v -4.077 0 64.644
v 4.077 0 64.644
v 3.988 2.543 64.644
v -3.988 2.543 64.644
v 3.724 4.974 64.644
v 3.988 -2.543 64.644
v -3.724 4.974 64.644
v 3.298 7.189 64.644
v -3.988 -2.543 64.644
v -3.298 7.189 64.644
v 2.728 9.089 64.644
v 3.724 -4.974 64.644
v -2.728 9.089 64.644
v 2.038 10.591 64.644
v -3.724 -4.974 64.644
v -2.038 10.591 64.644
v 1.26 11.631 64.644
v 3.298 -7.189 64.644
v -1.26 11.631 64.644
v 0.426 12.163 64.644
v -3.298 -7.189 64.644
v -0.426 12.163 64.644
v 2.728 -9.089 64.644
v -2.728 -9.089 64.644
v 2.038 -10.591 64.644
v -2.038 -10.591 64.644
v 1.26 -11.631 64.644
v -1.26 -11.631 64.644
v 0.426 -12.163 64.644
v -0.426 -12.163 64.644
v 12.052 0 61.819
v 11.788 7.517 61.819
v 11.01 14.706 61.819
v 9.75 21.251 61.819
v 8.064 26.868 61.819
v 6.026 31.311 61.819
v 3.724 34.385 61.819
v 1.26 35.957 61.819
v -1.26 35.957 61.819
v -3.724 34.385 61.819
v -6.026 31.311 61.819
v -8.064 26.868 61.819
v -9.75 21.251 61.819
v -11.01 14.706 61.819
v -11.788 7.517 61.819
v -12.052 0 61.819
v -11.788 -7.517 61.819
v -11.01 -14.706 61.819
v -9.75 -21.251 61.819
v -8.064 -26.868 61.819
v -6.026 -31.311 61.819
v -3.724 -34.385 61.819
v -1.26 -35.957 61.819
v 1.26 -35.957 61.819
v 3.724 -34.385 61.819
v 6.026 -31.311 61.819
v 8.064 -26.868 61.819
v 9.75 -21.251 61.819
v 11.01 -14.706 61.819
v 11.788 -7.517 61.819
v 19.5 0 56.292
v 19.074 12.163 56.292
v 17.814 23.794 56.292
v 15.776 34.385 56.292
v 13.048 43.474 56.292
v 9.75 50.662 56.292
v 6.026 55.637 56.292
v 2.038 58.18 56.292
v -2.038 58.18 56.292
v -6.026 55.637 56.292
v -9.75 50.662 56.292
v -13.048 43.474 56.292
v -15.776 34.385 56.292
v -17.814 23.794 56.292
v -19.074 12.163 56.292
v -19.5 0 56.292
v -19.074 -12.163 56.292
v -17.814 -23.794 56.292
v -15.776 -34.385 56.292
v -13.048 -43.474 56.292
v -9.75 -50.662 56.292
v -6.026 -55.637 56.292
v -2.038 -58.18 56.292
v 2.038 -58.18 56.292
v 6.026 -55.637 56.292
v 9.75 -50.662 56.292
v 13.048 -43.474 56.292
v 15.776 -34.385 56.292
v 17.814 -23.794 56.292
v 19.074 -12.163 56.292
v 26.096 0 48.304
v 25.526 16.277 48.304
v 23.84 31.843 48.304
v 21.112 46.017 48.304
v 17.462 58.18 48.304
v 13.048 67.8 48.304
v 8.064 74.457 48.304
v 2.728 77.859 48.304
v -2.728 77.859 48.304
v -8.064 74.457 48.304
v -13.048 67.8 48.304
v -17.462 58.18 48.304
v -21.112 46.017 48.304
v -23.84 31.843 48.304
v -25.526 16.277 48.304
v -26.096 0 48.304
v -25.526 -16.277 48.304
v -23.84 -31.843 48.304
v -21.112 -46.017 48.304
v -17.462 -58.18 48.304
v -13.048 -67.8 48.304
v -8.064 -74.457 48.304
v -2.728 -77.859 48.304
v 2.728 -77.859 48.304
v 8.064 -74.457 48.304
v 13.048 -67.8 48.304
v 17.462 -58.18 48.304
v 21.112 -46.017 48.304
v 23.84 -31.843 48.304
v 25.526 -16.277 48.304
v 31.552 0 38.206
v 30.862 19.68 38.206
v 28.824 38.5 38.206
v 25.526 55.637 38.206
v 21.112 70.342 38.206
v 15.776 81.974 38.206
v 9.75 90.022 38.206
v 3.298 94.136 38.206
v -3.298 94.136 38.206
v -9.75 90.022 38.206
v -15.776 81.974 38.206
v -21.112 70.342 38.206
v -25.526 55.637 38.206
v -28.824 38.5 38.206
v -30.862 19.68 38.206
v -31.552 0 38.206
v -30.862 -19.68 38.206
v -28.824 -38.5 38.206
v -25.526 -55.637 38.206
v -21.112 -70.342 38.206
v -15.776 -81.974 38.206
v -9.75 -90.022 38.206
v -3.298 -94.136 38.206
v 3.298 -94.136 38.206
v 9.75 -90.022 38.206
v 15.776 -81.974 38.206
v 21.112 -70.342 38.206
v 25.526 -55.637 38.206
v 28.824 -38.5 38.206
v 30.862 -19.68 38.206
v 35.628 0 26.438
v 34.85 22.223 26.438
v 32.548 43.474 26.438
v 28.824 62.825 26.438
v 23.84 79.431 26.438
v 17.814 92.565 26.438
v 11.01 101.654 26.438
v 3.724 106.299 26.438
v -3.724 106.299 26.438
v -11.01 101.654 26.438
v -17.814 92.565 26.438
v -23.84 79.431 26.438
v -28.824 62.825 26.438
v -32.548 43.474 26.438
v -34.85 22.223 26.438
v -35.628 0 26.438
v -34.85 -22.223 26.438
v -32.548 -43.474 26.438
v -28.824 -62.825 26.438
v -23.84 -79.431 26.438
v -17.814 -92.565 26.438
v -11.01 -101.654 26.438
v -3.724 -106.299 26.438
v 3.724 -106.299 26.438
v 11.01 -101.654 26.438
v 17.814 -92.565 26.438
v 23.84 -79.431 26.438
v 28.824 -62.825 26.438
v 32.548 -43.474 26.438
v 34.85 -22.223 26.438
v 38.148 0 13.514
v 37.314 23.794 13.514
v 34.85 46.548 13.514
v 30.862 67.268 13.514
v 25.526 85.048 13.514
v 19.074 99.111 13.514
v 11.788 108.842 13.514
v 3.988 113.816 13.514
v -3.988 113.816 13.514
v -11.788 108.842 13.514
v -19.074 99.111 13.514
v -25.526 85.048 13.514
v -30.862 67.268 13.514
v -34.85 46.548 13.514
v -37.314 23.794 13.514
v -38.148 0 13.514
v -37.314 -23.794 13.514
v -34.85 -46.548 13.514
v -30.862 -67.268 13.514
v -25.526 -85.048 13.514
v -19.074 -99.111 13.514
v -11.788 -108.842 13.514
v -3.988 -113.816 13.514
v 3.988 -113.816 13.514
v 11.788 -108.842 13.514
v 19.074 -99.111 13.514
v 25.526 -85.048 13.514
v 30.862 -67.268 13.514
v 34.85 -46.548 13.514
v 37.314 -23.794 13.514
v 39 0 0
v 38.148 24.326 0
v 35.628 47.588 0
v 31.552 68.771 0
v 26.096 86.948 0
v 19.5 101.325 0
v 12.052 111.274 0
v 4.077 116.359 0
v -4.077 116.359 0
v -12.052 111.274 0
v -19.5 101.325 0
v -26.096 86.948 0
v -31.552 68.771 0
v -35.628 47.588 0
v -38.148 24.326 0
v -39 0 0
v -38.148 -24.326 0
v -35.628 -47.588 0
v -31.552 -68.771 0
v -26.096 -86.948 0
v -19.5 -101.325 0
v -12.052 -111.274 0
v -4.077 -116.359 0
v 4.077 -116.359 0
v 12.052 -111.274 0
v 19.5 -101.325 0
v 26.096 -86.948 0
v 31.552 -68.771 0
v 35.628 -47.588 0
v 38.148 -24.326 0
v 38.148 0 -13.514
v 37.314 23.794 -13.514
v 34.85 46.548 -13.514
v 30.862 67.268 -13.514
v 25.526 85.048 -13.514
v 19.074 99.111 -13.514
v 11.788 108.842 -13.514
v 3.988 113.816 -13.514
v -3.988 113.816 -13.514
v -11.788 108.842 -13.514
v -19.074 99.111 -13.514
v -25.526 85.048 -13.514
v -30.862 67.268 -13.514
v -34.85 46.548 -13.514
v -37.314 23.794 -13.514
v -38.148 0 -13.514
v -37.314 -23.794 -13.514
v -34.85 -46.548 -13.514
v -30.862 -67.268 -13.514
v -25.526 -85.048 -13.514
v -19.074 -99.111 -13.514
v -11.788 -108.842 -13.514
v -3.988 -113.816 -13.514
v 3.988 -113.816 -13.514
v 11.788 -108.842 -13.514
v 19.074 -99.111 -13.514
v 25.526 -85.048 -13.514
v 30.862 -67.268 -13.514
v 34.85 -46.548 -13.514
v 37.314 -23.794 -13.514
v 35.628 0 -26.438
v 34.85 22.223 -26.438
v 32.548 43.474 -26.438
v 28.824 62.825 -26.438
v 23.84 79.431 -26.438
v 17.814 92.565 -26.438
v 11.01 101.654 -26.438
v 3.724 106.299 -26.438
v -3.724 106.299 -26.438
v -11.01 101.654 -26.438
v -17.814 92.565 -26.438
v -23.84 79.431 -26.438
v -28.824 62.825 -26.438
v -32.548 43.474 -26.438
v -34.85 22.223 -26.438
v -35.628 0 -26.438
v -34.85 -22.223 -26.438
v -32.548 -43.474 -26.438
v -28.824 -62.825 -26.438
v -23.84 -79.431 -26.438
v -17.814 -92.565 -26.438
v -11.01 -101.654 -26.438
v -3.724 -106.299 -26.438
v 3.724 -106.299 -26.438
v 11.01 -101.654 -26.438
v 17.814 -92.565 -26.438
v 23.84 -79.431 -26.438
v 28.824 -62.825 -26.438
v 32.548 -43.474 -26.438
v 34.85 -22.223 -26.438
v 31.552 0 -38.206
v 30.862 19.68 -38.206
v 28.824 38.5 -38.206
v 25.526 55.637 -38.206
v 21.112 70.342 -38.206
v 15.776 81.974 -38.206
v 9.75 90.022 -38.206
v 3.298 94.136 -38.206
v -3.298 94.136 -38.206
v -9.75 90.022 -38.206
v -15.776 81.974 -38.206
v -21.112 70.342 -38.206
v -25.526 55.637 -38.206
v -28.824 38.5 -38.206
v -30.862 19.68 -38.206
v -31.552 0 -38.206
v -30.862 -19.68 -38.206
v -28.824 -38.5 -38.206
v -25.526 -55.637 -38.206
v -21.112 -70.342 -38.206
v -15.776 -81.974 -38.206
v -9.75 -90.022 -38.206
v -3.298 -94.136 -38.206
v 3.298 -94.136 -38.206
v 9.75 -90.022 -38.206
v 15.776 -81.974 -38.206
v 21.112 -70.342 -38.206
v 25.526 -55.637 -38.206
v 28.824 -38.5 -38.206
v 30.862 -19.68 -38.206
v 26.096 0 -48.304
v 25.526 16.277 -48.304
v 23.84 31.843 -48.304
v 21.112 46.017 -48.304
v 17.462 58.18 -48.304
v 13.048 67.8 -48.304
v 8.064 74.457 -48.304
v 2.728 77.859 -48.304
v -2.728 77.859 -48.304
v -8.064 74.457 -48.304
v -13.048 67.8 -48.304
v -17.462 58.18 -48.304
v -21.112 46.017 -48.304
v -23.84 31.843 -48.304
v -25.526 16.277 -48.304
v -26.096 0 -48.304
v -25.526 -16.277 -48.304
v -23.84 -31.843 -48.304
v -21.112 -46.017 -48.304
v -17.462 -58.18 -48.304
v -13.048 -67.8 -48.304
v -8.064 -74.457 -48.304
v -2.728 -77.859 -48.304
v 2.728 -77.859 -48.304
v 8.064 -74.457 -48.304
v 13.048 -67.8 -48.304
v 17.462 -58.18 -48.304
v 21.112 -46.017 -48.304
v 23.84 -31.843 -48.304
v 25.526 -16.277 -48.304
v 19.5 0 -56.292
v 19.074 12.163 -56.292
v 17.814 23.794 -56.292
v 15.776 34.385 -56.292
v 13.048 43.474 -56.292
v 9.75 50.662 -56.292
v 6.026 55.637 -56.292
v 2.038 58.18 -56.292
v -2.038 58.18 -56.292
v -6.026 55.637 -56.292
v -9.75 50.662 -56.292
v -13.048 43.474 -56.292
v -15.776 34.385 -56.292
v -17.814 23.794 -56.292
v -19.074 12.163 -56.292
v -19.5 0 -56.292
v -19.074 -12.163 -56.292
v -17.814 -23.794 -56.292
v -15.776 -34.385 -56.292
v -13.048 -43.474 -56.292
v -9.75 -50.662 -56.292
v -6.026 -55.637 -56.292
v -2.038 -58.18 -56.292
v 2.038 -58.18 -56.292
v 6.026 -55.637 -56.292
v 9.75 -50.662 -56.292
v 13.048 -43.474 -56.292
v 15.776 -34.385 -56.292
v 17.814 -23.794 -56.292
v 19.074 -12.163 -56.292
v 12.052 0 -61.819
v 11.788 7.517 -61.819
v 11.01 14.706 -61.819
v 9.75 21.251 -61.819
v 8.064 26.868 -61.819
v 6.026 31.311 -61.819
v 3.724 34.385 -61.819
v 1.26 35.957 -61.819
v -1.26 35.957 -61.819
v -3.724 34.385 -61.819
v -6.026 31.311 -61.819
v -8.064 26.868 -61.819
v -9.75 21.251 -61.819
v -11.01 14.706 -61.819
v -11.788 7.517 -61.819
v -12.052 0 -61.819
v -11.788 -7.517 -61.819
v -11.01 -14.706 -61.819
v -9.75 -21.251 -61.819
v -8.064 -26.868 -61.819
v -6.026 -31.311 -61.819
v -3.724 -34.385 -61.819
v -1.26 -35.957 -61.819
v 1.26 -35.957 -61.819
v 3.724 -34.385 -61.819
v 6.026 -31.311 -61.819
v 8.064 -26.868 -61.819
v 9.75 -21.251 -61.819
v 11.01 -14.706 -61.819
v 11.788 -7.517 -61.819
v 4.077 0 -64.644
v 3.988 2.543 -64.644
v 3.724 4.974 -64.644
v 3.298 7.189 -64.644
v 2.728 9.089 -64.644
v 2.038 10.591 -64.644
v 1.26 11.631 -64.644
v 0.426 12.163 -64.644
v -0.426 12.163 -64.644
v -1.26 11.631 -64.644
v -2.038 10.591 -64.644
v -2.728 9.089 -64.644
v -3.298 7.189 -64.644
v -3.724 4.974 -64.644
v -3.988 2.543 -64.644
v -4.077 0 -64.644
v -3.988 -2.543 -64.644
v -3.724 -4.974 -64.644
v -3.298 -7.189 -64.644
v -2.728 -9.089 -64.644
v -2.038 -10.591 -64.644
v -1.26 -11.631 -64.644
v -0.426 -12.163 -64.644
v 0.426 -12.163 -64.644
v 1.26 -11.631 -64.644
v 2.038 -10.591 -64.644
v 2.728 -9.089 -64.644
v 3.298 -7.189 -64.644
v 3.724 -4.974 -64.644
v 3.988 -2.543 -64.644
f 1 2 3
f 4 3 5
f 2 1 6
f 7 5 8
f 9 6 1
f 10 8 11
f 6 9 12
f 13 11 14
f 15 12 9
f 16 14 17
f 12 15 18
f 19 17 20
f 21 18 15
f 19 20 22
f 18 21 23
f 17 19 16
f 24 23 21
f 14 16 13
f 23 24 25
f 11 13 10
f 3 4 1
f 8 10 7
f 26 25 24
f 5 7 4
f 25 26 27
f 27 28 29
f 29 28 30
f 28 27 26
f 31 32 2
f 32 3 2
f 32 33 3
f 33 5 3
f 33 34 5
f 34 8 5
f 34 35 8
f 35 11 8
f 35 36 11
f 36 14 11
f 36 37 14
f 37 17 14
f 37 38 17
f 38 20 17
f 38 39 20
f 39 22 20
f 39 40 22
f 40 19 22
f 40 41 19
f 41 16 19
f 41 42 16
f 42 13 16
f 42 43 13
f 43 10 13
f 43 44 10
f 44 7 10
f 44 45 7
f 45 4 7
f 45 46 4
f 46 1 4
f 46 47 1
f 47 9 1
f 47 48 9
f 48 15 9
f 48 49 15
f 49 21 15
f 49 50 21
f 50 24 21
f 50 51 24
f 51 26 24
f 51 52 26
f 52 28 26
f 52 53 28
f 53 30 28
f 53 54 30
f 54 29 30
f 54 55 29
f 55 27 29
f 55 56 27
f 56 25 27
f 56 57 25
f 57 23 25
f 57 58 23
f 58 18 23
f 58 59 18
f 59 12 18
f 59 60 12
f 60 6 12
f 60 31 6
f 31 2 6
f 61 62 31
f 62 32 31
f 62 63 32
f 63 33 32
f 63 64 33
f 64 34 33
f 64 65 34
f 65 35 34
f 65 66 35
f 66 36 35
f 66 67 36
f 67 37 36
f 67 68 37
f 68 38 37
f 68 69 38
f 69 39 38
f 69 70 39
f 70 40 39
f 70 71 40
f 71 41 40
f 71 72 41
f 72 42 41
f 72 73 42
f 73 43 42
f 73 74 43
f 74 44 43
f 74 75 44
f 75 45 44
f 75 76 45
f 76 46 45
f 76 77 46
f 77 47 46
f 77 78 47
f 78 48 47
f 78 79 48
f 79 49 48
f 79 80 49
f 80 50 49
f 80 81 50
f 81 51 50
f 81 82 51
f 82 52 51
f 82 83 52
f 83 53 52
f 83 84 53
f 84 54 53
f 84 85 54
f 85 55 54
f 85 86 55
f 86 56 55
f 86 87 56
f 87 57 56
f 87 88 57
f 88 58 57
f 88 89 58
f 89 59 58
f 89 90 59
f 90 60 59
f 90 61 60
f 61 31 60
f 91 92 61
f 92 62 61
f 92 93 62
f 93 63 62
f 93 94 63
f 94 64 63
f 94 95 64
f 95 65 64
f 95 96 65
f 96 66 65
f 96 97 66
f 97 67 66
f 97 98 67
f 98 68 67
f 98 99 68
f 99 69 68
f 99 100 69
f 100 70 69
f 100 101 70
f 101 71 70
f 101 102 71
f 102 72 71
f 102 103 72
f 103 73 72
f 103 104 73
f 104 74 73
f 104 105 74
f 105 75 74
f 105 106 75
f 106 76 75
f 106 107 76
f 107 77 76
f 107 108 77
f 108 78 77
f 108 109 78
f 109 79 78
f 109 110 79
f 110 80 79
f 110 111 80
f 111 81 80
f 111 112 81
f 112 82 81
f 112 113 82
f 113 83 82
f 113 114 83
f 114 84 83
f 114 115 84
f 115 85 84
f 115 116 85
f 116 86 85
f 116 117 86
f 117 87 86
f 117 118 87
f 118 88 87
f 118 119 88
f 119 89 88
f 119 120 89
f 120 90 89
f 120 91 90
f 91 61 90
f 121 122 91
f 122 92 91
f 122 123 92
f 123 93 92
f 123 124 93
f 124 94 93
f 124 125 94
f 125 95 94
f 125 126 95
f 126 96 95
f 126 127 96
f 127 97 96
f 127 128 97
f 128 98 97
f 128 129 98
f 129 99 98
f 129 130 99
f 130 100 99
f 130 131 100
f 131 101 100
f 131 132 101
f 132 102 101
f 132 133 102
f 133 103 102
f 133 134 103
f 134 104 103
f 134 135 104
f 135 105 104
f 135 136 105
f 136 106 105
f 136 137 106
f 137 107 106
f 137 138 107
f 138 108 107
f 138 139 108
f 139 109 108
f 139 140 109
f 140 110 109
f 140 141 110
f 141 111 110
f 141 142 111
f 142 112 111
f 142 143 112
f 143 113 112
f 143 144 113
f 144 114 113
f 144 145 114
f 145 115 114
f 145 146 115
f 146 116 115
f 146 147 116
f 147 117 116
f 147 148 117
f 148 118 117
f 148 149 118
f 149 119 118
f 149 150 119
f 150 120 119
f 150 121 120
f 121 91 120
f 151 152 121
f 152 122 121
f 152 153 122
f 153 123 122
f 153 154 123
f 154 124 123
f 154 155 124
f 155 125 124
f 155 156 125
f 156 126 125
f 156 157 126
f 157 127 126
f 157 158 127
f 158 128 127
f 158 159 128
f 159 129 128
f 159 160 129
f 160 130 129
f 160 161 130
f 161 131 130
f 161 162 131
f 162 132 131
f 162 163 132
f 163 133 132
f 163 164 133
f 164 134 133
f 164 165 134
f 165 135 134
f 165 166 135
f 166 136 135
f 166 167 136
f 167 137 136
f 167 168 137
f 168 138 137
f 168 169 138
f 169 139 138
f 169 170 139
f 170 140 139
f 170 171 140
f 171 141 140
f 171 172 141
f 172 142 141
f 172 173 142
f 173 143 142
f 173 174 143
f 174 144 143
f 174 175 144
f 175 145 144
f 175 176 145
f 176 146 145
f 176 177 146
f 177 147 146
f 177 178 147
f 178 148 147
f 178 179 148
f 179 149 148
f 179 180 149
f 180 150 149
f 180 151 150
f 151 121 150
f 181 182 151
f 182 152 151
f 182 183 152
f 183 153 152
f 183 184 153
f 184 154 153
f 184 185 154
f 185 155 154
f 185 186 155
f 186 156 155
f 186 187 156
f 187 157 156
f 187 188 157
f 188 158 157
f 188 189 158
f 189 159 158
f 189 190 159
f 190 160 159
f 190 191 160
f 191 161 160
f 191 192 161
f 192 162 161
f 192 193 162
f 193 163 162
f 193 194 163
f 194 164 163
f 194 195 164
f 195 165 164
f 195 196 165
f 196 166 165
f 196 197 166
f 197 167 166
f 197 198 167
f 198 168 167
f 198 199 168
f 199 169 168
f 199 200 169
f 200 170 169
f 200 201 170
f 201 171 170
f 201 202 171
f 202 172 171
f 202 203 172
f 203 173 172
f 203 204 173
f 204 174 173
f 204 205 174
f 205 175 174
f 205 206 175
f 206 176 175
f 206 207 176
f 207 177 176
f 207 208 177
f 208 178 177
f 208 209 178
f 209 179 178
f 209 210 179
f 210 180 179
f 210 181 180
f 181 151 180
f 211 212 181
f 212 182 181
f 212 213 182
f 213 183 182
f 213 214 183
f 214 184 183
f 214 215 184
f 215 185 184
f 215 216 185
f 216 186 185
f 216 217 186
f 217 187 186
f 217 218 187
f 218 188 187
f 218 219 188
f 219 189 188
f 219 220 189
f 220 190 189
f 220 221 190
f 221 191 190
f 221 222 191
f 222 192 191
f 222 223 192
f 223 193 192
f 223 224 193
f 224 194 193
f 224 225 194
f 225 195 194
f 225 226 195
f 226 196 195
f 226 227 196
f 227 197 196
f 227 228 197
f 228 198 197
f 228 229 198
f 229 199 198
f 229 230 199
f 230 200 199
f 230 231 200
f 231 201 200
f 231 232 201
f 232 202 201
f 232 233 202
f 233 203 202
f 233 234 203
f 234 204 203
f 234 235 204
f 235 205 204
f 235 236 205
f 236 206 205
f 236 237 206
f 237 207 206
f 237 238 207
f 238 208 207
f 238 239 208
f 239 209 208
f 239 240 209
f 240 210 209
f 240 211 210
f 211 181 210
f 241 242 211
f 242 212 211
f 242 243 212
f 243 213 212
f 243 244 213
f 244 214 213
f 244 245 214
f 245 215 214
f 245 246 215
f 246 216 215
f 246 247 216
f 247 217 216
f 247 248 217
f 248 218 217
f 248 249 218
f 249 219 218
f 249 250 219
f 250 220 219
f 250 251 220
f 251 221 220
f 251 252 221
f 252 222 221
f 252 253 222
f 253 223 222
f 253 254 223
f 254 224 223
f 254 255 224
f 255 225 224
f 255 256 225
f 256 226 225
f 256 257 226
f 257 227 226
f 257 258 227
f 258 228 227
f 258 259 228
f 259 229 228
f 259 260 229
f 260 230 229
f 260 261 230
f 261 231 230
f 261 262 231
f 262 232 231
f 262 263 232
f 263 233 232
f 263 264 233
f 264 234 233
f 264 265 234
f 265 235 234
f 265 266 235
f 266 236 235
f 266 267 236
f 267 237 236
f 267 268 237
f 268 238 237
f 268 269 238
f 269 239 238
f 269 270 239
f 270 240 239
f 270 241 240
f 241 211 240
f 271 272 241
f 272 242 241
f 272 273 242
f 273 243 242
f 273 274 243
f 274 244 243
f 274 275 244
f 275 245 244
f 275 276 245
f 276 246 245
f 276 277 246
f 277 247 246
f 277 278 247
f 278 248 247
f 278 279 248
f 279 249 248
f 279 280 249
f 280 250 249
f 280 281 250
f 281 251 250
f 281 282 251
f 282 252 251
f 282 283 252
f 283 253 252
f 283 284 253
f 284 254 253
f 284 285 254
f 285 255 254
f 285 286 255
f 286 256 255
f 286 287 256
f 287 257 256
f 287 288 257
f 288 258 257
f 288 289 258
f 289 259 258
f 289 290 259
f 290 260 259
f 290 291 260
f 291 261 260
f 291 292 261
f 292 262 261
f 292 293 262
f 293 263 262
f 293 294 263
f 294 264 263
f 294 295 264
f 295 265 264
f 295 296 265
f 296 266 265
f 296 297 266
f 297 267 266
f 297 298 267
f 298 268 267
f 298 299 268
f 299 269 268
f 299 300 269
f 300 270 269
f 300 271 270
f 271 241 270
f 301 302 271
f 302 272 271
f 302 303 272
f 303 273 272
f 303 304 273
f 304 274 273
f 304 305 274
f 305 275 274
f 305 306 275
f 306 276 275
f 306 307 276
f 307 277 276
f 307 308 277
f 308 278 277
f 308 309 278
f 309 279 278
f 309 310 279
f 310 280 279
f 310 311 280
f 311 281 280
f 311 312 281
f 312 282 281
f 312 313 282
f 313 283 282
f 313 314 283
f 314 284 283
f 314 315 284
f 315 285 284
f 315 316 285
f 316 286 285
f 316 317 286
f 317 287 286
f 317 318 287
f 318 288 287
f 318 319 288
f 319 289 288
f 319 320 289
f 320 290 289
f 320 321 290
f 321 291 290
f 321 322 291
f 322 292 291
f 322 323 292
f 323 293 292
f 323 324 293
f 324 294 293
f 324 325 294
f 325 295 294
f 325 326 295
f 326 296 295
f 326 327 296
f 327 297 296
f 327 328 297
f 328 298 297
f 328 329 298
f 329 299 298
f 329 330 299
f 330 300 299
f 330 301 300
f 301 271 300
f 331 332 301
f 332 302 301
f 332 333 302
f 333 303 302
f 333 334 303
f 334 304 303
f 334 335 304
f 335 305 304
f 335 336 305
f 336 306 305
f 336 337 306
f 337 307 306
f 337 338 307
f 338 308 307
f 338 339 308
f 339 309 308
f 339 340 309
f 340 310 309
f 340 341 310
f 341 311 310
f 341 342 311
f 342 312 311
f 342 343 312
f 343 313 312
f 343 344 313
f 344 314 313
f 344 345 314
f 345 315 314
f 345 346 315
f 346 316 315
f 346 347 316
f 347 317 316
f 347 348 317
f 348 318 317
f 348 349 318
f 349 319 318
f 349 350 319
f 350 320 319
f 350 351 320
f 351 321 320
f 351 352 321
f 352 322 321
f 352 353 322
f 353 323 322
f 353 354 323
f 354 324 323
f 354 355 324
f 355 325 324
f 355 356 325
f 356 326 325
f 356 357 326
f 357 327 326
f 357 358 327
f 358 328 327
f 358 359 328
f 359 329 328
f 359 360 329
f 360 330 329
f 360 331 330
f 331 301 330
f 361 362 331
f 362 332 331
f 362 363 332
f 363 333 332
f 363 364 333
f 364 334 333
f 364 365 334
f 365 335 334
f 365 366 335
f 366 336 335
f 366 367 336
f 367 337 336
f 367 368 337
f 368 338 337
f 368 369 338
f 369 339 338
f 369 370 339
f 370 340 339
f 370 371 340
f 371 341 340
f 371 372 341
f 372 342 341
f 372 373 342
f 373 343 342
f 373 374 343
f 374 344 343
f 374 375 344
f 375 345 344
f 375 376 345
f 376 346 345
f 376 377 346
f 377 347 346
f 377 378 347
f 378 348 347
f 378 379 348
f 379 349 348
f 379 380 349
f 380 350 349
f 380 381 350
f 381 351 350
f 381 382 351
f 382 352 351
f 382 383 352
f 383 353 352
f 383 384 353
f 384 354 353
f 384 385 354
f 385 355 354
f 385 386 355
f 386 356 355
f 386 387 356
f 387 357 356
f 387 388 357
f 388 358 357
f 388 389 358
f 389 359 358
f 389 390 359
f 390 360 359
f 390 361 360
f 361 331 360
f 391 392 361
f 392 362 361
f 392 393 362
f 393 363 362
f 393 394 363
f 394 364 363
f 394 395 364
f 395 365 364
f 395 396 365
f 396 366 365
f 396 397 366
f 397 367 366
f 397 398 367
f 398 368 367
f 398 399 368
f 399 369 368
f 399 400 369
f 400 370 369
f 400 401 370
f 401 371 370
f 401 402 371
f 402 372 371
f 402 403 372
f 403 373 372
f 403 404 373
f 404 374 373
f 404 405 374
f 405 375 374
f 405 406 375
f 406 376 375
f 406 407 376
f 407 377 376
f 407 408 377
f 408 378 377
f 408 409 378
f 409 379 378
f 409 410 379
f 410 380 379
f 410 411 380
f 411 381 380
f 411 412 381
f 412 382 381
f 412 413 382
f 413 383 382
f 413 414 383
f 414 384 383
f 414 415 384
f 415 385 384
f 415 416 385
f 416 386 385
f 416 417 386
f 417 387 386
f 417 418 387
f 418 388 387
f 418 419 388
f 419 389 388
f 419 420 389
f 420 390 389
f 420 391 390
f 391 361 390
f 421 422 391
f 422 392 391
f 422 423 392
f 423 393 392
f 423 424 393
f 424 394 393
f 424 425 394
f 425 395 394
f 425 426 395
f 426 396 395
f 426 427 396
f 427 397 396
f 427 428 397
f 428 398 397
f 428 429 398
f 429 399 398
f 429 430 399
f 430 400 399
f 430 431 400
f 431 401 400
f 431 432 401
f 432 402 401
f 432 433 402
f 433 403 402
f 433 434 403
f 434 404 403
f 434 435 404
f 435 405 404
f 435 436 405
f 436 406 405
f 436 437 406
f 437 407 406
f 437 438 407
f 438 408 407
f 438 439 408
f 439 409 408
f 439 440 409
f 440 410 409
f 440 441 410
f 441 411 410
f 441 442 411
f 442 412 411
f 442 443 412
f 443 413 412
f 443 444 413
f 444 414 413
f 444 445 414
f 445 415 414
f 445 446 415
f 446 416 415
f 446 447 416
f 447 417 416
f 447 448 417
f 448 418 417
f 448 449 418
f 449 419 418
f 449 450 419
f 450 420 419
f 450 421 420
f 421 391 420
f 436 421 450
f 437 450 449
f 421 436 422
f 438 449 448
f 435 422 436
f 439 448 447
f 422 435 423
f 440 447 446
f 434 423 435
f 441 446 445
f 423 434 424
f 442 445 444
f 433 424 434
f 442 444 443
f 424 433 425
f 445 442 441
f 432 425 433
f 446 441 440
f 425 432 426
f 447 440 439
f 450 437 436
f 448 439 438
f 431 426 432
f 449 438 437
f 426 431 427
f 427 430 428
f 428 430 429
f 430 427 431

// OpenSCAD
// Generated by SolidPython 1.0.1 on 2020-07-29 00:46:45


scale(v = [3, 9, 5]) {
	sphere(r = 13);
}
/***********************************************
*********      SolidPython code:      **********
************************************************
 
# import packages: SolidPython
from solid import *
from solid.utils import *
from itertools import chain, combinations, permutations


class Resize:

    def __init__(self, scad_file):
        self.scad_file = scad_file
        #self.scad_file = import_scad(scad_file)
        # cone/cylinder param:
        self.r1 = 0
        self.r2 = 0
        self.h = 0
        # rectangular prism param:
        self.w = 0
        self.l = 0
        # ellipse param:
        self.r = 0

    # import OpenScad code (file name corresponds to shape)


    # classify shape + parameters
    def assign(self, param1, param2, param3):
        if self.scad_file == 'cone.scad':
            self.r1 = param1
            self.r2 = param2
            self.h = param3
        elif self.scad_file == 'cylinder.scad':
            self.r1 = param1
            self.r2 = param2
            self.h = param3
        elif self.scad_file == 'rectangularPrism.scad':
            self.h = param1
            self.l = param2
            self.w = param3
        else:
            self.r = param1
            self.h = param2

    # resize parameters
    def iterate(self):
        x = range(3, 20, 2)
        i = 1
        if self.scad_file == 'cone.scad':
            tempList = list(permutations(x, 2))
            for temp in tempList:
                param1 = temp[0]
                param2 = temp[1]
                filepath = 'produced_scad_files/' + 'cone' + str(param1) + '_' + str(param2) + '_' + '.scad'
                scad_render_to_file(cylinder(h=param1, r1=param2, r2=0), filepath)

        elif self.scad_file == 'cylinder.scad':
            tempList = list(permutations(x, 3))
            for temp in tempList:
                param1 = temp[0]
                param2 = temp[1]
                filepath = 'produced_scad_files/' + 'cylinder' + str(param1) + '_' + str(param2) + '_' + '.scad'
                scad_render_to_file(cylinder(h=param1, r1=param2, r2=param2), filepath)

        elif self.scad_file == 'rectangularPrism.scad':
            tempList = list(permutations(x, 3))
            for temp in tempList:
                param1 = temp[0]
                param2 = temp[1]
                param3 = temp[2]
                filepath = 'produced_scad_files/' + 'rectangularPrism' + str(param1) + '_' + str(param2) + '_' + str(
                    param3) + '.scad'
                scad_render_to_file(cube(size=(param1, param2, param3)), filepath)

        elif self.scad_file == 'ellipse.scad':
            tempList = list(permutations(x, 4))
            for temp in tempList:
                param1 = temp[0]
                param2 = temp[1]
                param3 = temp[2]
                param4 = temp[3]
                filepath = 'produced_scad_files/' + 'ellipse' + str(param1) + '_' + str(param2) + '_' + str(param3) + '_' + str(param4) + '.scad'
                scad_render_to_file(scale([param1, param2, param3])(sphere(r=param4)), filepath)

    def render_to_scadfile(self):
        scad_render_to_file(scad, 'example.scad') 
 
************************************************/
